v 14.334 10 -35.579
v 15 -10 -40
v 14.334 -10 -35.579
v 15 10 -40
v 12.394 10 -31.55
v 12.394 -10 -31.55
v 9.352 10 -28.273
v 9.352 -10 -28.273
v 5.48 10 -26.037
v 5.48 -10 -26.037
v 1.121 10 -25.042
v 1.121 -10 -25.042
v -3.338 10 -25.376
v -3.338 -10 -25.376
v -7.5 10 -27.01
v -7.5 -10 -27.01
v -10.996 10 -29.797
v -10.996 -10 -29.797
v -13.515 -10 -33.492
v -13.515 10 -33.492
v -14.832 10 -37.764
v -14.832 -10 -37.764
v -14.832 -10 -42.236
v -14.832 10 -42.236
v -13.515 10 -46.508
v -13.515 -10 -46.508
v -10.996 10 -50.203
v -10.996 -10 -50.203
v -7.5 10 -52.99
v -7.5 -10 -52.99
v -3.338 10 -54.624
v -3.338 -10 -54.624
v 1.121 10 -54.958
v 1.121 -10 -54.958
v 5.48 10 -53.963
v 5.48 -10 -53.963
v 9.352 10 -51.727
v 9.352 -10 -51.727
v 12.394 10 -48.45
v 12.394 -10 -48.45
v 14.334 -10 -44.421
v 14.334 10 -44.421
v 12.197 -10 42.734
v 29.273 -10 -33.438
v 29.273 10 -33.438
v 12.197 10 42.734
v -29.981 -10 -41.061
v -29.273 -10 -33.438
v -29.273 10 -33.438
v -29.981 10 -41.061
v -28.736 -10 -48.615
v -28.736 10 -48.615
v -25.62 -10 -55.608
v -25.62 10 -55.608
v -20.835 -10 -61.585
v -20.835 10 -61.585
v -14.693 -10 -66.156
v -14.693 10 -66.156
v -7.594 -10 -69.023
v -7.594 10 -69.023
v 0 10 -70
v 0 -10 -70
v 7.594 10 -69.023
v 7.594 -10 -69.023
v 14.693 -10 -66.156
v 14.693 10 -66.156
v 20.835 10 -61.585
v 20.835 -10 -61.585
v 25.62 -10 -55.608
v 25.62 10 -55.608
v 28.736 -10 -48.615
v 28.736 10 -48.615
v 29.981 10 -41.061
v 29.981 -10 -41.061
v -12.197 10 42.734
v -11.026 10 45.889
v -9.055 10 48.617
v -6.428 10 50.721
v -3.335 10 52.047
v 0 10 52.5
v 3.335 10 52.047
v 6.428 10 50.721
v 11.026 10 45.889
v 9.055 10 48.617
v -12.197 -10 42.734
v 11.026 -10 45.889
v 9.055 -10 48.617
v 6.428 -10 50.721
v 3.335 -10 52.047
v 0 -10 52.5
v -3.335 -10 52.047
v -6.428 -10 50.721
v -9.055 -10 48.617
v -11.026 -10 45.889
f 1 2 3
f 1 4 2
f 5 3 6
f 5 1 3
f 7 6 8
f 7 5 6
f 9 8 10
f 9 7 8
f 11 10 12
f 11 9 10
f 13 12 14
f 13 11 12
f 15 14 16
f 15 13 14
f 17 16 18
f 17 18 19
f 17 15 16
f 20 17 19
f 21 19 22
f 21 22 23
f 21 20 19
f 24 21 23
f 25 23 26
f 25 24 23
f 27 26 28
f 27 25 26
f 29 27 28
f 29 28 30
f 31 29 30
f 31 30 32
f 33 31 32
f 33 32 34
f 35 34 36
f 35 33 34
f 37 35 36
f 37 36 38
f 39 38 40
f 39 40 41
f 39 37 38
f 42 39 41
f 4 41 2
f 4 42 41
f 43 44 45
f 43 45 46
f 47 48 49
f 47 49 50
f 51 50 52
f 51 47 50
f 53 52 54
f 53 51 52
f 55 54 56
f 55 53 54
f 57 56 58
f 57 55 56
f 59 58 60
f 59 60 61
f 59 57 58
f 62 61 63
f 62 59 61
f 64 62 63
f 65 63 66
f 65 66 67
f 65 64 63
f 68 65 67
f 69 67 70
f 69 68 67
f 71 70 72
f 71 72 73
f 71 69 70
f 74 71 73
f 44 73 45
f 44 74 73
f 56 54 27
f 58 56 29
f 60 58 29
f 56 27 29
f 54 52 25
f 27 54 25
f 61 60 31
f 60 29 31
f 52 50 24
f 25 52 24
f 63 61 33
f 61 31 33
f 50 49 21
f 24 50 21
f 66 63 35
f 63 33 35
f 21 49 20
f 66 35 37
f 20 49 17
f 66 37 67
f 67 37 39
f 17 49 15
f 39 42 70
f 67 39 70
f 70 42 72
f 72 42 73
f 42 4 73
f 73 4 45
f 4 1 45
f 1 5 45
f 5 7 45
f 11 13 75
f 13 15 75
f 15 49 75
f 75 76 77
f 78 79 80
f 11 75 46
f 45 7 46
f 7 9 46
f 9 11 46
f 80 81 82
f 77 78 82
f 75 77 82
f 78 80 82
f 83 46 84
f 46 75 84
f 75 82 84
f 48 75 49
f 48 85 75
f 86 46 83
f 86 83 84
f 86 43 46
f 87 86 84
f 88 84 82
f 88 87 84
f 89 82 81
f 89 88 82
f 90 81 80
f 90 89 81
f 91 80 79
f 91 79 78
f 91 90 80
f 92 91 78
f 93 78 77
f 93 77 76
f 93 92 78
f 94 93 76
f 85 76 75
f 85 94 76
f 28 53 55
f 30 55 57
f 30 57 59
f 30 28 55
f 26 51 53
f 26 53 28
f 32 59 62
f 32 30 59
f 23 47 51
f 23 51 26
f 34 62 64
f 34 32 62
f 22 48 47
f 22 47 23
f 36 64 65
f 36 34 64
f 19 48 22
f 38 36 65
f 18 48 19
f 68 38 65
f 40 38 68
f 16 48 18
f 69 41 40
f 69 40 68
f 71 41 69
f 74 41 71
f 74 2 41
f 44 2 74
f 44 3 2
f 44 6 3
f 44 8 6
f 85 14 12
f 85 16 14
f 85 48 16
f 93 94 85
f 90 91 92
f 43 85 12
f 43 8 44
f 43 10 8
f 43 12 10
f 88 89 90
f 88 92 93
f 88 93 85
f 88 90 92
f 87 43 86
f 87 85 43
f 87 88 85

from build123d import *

# Parameters (mm, degrees)
F0_R     = 15
F1_DEPTH = 10


with BuildPart() as f1:
    # F0 (on Front) → F1 (new body, symmetric)
    with BuildSketch(Plane.XZ):
        with BuildLine():
            Line((-12.197262, 42.734375), (-29.273428, -33.4375))
            ThreePointArc((-29.273428, -33.4375), (0, -70), (29.273428, -33.4375))
            Line((29.273428, -33.4375), (12.197262, 42.734375))
            ThreePointArc((12.197262, 42.734375), (0, 52.5), (-12.197262, 42.734375))
        make_face()
        with Locations((0, -40)):
            Circle(F0_R, mode=Mode.SUBTRACT)
    extrude(amount=F1_DEPTH, both=True)


solid = f1.part
